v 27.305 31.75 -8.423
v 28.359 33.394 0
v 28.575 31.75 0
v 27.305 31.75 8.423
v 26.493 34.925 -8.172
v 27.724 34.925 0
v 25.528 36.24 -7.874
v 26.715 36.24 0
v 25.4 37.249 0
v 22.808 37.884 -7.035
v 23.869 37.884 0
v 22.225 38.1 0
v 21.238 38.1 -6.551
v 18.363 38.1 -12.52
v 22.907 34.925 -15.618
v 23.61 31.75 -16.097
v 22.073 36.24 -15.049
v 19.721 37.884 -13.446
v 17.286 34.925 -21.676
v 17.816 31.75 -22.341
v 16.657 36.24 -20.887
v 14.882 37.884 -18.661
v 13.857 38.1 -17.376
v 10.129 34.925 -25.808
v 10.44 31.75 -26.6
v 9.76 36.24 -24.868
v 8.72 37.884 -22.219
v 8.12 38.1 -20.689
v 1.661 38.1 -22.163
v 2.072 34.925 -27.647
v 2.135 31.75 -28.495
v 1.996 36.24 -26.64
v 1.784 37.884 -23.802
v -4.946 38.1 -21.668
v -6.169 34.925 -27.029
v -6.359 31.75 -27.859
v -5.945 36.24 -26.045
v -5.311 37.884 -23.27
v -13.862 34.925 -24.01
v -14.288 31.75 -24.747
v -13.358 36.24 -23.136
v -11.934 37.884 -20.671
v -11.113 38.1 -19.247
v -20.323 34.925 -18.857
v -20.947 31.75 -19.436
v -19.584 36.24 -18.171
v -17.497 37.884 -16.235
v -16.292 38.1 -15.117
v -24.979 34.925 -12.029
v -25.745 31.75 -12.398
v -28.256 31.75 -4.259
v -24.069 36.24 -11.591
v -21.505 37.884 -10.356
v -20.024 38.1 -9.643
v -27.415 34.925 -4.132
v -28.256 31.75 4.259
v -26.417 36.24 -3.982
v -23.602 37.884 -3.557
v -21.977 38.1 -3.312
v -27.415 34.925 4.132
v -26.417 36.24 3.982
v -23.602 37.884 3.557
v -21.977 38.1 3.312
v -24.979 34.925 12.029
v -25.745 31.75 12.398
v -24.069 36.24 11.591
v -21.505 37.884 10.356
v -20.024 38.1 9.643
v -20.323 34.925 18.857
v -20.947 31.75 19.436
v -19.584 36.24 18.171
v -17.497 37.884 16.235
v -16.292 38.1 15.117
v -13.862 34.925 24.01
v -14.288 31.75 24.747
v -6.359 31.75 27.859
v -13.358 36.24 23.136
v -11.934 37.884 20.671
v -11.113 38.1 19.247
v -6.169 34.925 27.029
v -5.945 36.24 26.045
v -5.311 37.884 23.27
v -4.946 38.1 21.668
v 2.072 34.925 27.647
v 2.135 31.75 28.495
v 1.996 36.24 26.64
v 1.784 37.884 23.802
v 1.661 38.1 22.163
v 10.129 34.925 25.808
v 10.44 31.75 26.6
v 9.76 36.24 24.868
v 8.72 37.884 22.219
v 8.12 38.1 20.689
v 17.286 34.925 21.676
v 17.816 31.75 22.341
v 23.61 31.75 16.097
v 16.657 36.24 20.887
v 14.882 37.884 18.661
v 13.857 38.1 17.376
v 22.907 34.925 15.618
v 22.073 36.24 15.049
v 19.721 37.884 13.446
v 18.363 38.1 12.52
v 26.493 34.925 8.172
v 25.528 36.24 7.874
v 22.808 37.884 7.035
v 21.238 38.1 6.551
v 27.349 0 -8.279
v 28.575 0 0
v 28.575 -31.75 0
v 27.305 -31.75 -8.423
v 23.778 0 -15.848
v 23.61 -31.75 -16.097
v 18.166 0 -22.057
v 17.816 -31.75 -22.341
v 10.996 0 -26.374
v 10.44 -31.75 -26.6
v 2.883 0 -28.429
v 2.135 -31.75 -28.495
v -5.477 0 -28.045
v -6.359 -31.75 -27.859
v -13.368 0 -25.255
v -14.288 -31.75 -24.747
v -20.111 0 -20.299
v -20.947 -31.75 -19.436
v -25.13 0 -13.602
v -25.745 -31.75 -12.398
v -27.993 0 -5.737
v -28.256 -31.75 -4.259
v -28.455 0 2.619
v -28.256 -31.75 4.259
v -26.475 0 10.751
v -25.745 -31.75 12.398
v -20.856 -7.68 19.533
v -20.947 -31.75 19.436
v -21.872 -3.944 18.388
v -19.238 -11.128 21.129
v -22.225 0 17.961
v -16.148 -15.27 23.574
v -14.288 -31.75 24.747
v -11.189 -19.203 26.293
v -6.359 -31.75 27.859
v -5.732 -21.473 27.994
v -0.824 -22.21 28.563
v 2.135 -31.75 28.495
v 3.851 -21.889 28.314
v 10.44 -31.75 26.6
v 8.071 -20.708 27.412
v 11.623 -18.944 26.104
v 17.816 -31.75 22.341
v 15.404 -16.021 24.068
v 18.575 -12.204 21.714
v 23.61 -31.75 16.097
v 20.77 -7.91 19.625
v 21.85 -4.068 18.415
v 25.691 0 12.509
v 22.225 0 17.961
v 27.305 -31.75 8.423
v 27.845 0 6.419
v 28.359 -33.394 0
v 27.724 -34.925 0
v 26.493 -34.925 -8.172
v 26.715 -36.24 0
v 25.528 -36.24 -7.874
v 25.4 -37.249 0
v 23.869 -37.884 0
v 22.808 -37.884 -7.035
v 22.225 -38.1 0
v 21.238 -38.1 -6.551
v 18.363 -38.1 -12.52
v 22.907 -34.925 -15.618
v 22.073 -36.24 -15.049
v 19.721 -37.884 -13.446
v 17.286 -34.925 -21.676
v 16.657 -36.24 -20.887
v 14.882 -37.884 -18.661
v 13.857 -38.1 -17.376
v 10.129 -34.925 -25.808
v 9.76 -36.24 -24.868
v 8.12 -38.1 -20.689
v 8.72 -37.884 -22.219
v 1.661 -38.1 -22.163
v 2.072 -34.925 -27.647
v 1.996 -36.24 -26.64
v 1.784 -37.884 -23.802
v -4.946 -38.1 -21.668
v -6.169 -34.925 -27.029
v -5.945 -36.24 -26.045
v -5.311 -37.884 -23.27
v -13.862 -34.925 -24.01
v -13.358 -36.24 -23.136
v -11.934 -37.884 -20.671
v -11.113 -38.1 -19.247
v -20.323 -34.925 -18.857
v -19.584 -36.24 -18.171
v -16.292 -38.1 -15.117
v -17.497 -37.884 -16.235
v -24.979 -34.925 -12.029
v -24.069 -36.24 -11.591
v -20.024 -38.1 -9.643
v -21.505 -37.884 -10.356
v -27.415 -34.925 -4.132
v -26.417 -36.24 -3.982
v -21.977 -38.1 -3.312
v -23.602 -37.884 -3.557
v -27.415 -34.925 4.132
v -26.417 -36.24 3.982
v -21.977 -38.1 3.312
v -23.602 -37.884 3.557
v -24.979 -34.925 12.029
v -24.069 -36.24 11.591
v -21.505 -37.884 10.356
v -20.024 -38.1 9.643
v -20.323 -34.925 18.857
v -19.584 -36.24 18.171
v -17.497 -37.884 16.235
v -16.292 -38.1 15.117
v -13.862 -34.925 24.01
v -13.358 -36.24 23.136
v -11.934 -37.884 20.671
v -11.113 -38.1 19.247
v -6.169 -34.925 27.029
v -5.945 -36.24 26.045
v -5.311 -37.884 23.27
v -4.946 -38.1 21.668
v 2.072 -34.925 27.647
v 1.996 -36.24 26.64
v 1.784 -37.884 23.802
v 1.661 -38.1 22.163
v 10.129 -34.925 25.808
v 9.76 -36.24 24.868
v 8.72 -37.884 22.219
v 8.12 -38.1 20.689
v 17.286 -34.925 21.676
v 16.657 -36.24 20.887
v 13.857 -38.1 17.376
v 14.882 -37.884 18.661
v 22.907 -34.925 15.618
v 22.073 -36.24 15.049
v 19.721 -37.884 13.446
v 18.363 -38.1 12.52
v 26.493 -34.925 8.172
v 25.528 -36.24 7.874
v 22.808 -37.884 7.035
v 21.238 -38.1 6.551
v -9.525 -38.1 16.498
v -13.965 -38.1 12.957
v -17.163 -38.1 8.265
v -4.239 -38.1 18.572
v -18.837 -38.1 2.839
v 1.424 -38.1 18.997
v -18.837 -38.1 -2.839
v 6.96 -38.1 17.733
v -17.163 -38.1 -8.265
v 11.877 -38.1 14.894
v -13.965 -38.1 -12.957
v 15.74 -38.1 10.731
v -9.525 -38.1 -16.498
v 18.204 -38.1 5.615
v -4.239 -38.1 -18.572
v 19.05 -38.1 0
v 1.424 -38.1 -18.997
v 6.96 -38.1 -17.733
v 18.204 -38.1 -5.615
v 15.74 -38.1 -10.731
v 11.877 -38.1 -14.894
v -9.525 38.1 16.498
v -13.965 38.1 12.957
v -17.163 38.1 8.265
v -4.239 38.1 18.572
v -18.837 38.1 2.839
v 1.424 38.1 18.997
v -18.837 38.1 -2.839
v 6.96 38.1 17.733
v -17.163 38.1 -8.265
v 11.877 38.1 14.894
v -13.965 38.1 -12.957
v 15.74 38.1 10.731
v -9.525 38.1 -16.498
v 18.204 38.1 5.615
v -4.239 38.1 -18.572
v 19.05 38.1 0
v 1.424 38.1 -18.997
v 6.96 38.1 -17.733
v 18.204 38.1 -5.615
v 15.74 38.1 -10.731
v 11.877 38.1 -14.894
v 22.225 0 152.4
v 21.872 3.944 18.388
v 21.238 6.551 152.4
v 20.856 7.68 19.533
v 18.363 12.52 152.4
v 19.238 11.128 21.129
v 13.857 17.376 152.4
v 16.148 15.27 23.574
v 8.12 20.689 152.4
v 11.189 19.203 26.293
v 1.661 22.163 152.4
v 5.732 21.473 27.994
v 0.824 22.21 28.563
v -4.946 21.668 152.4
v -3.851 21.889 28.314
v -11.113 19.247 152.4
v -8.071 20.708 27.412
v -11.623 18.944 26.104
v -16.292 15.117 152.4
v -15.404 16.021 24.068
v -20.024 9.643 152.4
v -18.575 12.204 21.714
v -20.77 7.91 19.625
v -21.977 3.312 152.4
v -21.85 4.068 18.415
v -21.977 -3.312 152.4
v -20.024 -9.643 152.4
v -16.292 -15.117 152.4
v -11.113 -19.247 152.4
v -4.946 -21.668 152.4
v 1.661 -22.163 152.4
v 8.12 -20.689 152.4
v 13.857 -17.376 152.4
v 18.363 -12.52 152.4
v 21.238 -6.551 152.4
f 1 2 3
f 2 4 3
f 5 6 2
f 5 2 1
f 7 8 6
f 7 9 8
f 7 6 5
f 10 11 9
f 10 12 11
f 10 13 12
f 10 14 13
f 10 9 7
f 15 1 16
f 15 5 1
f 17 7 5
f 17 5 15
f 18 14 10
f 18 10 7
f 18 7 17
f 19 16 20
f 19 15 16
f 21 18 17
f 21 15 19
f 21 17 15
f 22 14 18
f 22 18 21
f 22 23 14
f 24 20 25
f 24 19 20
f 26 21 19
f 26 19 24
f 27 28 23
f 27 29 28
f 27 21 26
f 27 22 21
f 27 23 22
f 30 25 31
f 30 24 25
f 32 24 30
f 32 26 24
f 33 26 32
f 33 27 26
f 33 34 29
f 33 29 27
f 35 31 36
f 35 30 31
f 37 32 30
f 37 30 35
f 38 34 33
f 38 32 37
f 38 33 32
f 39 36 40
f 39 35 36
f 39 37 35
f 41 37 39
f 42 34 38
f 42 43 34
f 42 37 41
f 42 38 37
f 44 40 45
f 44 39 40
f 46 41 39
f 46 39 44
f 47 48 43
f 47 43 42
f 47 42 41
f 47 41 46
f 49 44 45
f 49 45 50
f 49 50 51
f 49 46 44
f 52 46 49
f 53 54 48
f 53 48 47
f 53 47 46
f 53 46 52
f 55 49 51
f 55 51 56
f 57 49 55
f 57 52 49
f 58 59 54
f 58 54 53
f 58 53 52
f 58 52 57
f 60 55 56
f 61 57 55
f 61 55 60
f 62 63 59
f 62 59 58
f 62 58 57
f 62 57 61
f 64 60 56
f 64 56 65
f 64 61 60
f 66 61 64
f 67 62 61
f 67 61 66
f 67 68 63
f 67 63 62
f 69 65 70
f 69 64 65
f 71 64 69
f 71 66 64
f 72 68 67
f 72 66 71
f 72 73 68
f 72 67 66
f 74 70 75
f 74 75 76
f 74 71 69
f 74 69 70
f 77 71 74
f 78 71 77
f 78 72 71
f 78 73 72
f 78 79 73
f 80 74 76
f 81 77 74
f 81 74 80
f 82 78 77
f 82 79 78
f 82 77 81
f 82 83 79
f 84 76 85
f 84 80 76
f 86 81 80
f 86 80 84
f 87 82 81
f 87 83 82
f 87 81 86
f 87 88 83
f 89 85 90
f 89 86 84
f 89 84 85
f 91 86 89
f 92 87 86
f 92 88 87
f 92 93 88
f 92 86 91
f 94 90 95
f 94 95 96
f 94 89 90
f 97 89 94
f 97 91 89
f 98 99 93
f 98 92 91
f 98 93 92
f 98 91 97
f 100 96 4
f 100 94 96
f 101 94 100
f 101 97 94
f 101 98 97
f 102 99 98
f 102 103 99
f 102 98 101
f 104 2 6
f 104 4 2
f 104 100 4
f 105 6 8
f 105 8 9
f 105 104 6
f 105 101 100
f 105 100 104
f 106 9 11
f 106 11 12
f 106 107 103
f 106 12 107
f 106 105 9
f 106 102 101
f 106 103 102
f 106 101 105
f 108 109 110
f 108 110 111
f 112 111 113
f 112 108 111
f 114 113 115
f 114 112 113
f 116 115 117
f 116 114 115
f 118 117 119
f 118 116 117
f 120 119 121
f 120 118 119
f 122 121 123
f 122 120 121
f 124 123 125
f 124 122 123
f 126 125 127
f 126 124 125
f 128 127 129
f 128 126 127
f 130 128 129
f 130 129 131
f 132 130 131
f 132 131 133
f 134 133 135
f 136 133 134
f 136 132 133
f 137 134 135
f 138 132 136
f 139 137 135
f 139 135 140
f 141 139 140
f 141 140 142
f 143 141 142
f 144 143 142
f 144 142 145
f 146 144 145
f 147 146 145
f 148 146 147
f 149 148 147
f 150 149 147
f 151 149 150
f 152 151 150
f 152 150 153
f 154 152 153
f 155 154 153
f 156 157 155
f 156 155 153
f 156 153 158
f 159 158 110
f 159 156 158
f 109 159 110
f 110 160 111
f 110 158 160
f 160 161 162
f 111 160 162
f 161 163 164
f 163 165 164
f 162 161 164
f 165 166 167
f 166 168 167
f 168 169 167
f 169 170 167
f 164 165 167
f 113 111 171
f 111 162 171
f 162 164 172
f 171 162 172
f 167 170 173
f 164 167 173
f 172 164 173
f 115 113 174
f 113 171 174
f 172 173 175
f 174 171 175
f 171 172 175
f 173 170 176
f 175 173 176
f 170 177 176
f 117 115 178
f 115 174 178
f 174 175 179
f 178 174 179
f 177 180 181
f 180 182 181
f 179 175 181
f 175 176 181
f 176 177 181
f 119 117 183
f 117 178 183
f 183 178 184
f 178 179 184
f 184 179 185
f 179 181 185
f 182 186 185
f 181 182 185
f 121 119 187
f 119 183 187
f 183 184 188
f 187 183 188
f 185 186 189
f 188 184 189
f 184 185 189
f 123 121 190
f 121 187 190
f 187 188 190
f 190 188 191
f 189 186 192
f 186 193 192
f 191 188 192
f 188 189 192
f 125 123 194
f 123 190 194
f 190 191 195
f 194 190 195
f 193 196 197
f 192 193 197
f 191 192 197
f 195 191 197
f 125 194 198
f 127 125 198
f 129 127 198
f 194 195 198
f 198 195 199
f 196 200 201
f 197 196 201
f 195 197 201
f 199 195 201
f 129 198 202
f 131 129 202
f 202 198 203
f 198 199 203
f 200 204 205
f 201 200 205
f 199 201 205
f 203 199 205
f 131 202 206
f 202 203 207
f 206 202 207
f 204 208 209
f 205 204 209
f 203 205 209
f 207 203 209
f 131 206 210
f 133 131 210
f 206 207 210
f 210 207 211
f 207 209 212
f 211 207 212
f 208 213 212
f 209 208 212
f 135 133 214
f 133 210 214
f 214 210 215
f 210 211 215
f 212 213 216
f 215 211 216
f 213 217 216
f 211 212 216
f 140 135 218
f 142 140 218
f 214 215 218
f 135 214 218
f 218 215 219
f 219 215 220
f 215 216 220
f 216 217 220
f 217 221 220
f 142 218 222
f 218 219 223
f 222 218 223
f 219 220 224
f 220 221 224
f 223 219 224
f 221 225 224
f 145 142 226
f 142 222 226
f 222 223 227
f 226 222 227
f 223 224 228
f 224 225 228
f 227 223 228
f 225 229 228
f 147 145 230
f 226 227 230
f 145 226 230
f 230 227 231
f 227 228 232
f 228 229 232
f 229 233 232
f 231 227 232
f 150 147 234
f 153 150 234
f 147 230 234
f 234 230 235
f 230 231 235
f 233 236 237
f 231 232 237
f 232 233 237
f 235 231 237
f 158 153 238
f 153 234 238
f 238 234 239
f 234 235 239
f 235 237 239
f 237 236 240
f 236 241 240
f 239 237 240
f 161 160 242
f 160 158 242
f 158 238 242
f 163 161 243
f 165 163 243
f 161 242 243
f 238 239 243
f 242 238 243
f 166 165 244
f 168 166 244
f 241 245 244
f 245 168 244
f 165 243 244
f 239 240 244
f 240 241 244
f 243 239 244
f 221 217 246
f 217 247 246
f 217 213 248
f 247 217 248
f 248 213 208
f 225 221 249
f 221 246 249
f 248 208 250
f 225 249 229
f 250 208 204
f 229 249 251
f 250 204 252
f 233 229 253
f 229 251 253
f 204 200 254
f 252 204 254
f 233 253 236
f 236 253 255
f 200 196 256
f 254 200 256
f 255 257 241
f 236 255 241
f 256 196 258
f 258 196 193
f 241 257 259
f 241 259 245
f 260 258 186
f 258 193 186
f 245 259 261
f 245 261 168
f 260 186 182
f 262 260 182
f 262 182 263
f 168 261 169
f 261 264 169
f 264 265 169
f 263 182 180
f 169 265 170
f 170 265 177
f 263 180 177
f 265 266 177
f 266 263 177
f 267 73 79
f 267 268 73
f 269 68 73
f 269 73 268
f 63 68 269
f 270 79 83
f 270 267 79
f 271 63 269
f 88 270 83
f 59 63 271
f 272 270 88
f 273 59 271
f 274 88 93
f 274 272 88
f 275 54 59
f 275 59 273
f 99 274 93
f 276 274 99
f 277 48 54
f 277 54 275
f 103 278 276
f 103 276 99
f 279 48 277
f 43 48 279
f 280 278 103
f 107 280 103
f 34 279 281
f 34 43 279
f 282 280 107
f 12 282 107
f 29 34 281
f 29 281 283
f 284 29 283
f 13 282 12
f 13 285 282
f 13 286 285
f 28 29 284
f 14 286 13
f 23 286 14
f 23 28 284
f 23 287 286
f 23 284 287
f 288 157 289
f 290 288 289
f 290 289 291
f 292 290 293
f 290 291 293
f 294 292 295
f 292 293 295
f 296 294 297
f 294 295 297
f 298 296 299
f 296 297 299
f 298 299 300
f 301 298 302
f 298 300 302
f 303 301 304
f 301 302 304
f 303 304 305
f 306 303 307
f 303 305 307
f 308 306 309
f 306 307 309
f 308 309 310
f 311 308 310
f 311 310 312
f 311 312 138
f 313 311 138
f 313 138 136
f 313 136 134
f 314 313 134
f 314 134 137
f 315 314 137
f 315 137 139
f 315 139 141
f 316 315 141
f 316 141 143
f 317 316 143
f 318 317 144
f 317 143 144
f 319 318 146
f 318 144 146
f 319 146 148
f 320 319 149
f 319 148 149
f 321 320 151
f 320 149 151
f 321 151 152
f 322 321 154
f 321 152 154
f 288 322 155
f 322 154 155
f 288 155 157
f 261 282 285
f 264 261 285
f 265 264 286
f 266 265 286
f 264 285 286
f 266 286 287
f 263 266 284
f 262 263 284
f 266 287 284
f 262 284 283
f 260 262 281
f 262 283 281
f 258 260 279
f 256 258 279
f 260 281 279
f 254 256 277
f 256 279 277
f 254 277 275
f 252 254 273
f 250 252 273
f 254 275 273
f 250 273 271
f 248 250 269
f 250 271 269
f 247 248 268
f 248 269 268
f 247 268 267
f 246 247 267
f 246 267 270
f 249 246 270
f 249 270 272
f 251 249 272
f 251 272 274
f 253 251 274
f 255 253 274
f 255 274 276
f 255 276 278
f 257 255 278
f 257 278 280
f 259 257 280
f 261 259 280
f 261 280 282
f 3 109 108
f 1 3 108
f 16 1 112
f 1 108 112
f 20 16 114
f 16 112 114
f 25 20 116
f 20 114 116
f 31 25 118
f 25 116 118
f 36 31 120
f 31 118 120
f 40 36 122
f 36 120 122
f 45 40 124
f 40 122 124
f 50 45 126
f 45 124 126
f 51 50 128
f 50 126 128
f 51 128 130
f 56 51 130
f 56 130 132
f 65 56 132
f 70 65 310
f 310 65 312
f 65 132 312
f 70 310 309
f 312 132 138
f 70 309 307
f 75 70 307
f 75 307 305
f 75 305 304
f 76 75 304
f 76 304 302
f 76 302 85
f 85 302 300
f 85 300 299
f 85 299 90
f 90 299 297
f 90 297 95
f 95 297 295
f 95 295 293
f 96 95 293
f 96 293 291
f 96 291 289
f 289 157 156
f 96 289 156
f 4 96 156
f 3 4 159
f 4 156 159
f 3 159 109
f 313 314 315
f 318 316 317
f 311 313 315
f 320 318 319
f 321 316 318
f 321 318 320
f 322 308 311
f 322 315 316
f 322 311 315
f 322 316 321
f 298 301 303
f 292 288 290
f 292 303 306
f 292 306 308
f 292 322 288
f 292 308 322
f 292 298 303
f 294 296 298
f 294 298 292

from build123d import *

# Parameters (mm, degrees)
SKETCH2_R                = 22.225
BOSS_EXTRUDE1_DEPTH      = 152.4
BOSS_EXTRUDE2_DEPTH      = 38.1
BOSS_EXTRUDE2_DEPTH_BACK = 38.1
SKETCH3_R                = 28.575
SKETCH4_R                = 19.05
CUT_EXTRUDE1_DEPTH       = 98.298
FILLET1_R                = 6.35


with BuildPart() as part:
    # Sketch2 → Boss-Extrude1 (new body)
    with BuildSketch(Plane.XY):
        Circle(SKETCH2_R)
    extrude(amount=BOSS_EXTRUDE1_DEPTH)

    # Sketch3 → Boss-Extrude2 (add, two sides: drawn at the far end of the back side and taken through both)
    with BuildSketch(Plane(origin=(0, 0, 0), x_dir=(1, 0, 0), z_dir=(0, 1, 0)).offset(-BOSS_EXTRUDE2_DEPTH_BACK)):
        Circle(SKETCH3_R)
    extrude(amount=BOSS_EXTRUDE2_DEPTH + BOSS_EXTRUDE2_DEPTH_BACK)

    # Sketch4 → Cut-Extrude1 (cut)
    with BuildSketch(Plane(origin=(0, 38.1, 0), x_dir=(1, 0, 0), z_dir=(0, 1, 0))):
        Circle(SKETCH4_R)
    extrude(amount=-CUT_EXTRUDE1_DEPTH, mode=Mode.SUBTRACT)

    # Fillet1
    fillet1_edges = [part.edges().sort_by_distance(p)[0] for p in [
        (-28.575, -38.1, 0),
        (-28.575, 38.1, 0),
    ]]
    fillet(fillet1_edges, radius=FILLET1_R)


solid = part.part
